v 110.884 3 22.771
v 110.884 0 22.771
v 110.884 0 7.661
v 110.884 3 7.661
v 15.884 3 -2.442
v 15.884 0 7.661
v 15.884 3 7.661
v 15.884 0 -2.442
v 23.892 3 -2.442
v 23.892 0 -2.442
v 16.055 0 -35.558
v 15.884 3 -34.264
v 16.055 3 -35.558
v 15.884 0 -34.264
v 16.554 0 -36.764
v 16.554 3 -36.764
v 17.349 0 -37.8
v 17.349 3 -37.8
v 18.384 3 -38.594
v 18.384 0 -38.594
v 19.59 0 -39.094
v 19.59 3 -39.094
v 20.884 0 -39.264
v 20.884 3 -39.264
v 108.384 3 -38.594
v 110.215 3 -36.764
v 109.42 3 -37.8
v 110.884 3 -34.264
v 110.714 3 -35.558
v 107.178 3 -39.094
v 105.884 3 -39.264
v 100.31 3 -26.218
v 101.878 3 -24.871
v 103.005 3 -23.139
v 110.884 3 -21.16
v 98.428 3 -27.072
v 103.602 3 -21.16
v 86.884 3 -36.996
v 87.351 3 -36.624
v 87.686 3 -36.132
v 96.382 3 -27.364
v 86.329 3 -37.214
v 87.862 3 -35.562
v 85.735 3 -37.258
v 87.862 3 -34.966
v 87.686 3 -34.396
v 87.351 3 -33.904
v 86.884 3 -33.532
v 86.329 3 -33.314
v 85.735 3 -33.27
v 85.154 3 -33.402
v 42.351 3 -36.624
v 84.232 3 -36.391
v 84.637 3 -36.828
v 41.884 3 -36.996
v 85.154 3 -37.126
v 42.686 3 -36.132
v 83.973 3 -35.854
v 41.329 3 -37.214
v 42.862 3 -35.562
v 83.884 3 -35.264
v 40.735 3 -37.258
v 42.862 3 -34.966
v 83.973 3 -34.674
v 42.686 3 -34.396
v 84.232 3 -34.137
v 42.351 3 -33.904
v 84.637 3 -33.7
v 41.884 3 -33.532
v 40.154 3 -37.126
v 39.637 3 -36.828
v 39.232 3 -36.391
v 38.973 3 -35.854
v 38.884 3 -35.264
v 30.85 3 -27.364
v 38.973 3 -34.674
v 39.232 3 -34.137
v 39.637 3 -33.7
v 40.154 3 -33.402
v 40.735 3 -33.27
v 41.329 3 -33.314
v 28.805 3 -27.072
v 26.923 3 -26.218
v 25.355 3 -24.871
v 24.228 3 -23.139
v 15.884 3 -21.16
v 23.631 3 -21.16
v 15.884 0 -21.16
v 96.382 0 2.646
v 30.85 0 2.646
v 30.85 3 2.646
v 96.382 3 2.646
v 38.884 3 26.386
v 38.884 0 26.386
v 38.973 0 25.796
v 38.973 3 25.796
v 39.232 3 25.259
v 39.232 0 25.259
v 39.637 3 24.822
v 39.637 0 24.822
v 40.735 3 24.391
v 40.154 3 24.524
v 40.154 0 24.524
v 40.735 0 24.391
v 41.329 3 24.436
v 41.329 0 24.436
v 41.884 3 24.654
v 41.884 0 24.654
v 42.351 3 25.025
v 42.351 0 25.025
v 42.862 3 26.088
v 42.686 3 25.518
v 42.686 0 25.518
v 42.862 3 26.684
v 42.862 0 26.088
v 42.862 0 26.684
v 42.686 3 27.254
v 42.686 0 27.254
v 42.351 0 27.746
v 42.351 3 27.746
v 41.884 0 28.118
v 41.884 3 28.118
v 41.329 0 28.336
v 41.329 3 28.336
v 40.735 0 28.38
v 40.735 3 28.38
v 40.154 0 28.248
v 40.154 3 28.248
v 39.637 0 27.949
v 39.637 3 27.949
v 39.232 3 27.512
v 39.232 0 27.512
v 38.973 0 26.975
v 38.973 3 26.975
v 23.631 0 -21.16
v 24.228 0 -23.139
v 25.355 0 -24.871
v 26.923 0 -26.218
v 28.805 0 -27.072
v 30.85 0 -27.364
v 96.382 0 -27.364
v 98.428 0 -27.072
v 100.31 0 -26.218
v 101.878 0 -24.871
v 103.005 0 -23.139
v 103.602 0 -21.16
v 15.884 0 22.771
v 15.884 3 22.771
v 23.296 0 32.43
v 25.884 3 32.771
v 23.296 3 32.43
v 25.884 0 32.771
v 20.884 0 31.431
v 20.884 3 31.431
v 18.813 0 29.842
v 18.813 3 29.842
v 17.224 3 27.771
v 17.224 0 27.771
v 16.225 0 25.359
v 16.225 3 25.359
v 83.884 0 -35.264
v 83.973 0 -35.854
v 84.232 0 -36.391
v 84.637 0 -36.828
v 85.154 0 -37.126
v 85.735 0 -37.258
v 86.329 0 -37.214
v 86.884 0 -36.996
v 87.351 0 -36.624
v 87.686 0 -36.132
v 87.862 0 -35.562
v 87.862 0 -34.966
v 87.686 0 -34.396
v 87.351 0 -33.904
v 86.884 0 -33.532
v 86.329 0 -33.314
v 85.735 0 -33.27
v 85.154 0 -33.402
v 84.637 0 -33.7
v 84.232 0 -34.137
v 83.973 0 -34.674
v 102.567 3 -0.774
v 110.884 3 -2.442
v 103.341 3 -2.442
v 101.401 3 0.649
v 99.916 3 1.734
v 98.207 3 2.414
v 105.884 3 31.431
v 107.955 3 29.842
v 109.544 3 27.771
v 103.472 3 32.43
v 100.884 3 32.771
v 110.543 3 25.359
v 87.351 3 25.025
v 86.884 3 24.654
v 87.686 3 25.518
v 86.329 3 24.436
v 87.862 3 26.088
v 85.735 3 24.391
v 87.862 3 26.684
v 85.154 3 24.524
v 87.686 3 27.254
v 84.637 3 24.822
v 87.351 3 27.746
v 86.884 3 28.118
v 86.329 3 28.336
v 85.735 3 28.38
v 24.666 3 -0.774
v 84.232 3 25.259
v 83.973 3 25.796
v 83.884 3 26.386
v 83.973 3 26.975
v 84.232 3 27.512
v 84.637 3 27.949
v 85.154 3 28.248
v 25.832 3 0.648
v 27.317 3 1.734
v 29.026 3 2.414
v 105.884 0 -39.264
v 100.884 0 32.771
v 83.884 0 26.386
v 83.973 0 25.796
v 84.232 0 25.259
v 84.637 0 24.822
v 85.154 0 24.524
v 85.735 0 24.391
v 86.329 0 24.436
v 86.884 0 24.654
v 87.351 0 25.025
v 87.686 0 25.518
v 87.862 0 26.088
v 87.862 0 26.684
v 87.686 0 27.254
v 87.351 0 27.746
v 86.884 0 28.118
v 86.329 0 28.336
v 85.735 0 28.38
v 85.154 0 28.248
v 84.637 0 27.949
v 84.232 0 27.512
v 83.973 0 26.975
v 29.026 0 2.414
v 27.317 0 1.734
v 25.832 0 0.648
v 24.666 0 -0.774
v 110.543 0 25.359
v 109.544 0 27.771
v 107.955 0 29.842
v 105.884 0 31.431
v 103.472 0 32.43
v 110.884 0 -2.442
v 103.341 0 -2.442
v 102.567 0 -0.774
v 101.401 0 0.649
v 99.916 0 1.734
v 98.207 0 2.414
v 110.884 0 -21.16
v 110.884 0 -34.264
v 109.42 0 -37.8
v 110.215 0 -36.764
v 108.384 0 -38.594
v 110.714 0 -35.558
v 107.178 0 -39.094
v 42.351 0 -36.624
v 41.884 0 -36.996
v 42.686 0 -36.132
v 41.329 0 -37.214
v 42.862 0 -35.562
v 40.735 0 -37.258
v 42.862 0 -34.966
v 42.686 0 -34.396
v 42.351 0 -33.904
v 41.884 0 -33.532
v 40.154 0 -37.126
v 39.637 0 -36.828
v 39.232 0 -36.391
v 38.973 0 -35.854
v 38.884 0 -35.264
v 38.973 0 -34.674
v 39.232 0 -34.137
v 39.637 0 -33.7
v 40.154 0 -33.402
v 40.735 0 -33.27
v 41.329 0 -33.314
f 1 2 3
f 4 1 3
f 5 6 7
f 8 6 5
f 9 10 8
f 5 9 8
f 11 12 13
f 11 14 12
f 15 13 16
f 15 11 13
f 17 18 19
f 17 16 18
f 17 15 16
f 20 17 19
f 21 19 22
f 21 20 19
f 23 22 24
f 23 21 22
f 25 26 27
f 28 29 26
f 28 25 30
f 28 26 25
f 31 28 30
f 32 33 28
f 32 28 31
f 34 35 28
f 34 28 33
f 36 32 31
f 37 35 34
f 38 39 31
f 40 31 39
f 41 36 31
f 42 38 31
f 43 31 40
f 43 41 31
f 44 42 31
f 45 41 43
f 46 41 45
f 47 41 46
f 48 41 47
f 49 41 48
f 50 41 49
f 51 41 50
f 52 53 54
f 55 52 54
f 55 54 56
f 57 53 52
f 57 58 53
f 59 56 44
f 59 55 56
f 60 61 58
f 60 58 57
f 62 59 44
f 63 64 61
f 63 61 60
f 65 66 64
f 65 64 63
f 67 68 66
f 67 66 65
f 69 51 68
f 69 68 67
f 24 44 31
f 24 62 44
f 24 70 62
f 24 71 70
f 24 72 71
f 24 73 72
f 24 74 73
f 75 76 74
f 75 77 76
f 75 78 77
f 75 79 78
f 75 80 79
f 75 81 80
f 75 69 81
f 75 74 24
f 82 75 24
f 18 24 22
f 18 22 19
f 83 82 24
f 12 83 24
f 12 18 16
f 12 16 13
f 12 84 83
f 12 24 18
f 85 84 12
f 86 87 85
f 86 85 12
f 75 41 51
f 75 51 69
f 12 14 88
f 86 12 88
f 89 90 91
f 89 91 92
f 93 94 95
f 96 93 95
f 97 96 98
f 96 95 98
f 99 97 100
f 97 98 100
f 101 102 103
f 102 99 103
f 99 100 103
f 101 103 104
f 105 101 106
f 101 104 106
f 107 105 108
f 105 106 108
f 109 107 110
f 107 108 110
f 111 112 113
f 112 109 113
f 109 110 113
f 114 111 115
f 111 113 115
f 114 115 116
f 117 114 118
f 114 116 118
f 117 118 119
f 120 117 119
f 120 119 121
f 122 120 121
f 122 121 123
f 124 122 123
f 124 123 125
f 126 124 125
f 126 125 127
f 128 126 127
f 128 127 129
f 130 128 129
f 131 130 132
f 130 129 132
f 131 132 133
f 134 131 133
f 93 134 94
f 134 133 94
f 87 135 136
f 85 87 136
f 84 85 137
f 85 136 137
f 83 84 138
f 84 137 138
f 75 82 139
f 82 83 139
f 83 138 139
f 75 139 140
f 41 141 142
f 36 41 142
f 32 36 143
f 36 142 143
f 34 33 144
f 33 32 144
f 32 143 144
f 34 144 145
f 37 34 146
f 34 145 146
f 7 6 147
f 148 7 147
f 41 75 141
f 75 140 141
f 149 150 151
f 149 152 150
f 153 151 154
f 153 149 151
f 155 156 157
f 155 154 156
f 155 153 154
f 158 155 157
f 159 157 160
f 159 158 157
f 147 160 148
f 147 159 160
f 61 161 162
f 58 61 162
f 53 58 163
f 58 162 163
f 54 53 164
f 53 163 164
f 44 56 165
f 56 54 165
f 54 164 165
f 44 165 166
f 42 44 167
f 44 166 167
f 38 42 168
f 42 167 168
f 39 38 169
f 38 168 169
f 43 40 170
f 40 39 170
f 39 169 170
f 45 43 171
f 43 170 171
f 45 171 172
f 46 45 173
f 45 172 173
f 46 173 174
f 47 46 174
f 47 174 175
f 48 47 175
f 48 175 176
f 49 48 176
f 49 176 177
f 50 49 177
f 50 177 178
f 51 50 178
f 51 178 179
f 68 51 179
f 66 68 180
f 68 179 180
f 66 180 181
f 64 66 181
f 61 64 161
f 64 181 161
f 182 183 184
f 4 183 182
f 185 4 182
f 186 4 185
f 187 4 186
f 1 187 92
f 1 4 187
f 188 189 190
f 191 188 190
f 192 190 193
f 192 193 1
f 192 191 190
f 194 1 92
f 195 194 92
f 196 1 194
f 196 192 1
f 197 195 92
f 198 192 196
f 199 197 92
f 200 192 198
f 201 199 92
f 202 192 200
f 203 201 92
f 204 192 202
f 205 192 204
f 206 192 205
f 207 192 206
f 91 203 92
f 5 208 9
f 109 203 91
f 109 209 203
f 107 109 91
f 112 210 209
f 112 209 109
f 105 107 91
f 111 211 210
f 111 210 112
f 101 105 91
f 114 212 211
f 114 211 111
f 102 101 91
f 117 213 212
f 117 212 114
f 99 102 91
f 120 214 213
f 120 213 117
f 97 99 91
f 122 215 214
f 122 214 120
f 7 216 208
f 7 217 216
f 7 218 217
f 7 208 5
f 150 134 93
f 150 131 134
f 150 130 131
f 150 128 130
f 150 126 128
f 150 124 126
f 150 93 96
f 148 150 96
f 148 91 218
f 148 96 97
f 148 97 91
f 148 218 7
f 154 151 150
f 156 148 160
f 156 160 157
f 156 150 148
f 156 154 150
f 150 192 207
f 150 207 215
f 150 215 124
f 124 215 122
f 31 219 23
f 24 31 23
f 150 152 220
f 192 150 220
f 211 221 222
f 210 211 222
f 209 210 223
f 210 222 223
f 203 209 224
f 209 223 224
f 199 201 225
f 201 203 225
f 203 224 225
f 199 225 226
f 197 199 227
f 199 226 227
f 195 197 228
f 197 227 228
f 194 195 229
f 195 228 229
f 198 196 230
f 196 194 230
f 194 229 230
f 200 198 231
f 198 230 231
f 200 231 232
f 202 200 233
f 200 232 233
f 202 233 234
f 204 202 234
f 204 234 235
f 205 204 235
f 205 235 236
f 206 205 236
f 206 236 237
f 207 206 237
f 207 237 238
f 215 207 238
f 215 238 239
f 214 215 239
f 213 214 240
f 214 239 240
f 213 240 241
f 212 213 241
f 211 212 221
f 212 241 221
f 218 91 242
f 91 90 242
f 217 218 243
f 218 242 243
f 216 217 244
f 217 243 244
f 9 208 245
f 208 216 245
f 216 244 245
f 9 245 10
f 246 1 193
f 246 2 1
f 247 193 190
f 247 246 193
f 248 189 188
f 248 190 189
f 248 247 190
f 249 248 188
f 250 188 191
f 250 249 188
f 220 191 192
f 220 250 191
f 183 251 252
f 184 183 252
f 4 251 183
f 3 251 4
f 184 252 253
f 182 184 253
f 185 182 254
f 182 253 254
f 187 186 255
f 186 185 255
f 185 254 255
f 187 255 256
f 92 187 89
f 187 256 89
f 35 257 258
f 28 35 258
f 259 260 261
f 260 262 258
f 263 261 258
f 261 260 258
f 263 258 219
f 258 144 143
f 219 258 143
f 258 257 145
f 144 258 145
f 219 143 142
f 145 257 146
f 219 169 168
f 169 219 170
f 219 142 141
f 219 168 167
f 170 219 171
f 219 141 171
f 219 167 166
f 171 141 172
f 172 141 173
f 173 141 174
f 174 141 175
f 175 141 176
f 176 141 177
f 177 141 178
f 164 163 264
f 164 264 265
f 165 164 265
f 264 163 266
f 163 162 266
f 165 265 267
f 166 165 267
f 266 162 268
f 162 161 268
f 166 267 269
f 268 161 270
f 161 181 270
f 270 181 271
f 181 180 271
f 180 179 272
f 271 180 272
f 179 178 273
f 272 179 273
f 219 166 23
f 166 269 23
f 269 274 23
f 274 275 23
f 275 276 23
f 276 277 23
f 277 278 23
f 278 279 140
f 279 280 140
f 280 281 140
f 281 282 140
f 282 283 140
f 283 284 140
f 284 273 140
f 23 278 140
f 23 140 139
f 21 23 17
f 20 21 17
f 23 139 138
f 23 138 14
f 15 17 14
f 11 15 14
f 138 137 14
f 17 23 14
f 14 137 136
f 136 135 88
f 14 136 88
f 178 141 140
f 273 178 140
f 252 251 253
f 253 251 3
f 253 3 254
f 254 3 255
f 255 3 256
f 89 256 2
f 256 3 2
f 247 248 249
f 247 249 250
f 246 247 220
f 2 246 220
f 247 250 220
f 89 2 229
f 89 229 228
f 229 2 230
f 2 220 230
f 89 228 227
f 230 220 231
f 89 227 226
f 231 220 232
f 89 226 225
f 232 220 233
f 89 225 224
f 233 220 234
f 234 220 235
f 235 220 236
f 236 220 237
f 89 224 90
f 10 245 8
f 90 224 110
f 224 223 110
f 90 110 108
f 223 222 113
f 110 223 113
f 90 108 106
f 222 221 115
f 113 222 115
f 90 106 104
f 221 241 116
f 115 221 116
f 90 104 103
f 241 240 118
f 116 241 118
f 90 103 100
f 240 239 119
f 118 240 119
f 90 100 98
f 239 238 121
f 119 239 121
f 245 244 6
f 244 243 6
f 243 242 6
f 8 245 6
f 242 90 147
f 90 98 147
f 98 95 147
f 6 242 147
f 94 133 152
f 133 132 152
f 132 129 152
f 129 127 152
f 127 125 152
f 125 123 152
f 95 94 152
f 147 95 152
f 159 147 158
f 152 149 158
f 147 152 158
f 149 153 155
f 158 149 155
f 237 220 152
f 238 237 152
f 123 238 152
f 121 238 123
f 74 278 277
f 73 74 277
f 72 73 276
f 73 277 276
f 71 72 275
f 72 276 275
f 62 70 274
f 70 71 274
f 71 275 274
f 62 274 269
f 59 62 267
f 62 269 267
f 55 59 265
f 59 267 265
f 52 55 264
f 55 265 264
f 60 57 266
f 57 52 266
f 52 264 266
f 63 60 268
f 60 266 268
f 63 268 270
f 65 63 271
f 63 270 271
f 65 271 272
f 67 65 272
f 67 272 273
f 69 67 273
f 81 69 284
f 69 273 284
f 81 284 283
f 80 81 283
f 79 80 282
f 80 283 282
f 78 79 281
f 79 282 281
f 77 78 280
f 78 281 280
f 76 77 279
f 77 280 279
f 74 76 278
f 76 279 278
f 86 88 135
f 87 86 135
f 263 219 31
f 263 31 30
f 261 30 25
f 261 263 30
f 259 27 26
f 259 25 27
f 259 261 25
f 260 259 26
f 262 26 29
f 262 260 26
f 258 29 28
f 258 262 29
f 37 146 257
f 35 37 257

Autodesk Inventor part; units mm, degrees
ref_plane "YZ Plane" through (0, 0, 0) normal (1, 0, 0) x (0, 1, 0)
ref_plane "XZ Plane" through (0, 0, 0) normal (0, 1, 0) x (-1, 0, 0)
ref_plane "XY Plane" through (0, 0, 0) normal (0, 0, 1) x (1, 0, 0)
sketch "Sketch2" plane through (-170.3284, 0, 65.1839) normal (0, 1, 0) x (-1, 0, 0)
  line L0 (-194.2202, -67.6262) -> (-191.2126, -67.6262)
  line L1 (-276.2126, -67.6262) -> (-273.6697, -67.6262)
  arc A0 (-266.7109, -62.5378) -> (-273.6697, -67.6262) centre (-266.7109, -69.8403) ccw
  line L2 (-201.1789, -62.5378) -> (-266.7109, -62.5378)
  arc A1 (-194.2202, -67.6262) -> (-201.1789, -62.5378) centre (-201.1789, -69.8403) ccw
  arc A2 (-273.9303, -86.3444) -> (-266.7109, -92.5479) centre (-266.7109, -85.2454) ccw
  line L3 (-201.1789, -92.5479) -> (-266.7109, -92.5479)
  line L4 (-191.2128, -86.3444) -> (-193.9596, -86.3444)
  line L5 (-186.2128, -99.4479) -> (-186.2128, -96.4479)
  arc A3 (-191.2128, -104.4479) -> (-186.2128, -99.4479) centre (-191.2128, -99.4479) ccw
  line L6 (-276.2128, -104.4479) -> (-191.2128, -104.4479)
  arc A4 (-281.2128, -99.4479) -> (-276.2128, -104.4479) centre (-276.2128, -99.4479) ccw
  line L7 (-273.9303, -86.3444) -> (-276.2128, -86.3444)
  line L8 (-281.2128, -96.4479) -> (-281.2128, -99.4479)
  line L9 (-186.2128, -96.4479) -> (-186.2128, -86.3444)
  line L10 (-186.2128, -86.3444) -> (-191.2128, -86.3444)
  line L11 (-276.2128, -86.3444) -> (-281.2128, -86.3444)
  line L12 (-281.2128, -86.3444) -> (-281.2128, -96.4479)
  line L13 (-276.2126, -67.6262) -> (-281.2128, -67.6262)
  line L14 (-281.2128, -67.6262) -> (-281.2126, -57.5226)
  line L15 (-191.2126, -67.6262) -> (-186.2128, -67.6262)
  line L16 (-186.2126, -57.5226) -> (-186.2128, -67.6262)
  arc A5 (-201.1789, -92.5479) -> (-193.9596, -86.3444) centre (-201.1789, -85.2454) ccw
  circle A6 centre (-211.2128, -100.4479) radius 2
  circle A7 centre (-256.2128, -100.4479) radius 2
  circle A8 centre (-256.2128, -38.7981) radius 2
  circle A9 centre (-211.2128, -38.7981) radius 2
  arc A10 (-271.2126, -32.4132) -> (-281.2126, -42.4132) centre (-271.2126, -42.4132) ccw
  line L17 (-281.2126, -42.4132) -> (-281.2126, -57.5226)
  line L18 (-196.2126, -32.4132) -> (-271.2126, -32.4132)
  arc A11 (-186.2126, -42.4132) -> (-196.2126, -32.4132) centre (-196.2126, -42.4132) ccw
  line L19 (-186.2126, -57.5226) -> (-186.2126, -42.4132)
  point P0 (-250.4088, -36.9615)
  point P1 (-249.4088, -99.1804)
extrude "Extrusion1" add sketch "Sketch2" along normal blind 3
properties part number "spacer top"
